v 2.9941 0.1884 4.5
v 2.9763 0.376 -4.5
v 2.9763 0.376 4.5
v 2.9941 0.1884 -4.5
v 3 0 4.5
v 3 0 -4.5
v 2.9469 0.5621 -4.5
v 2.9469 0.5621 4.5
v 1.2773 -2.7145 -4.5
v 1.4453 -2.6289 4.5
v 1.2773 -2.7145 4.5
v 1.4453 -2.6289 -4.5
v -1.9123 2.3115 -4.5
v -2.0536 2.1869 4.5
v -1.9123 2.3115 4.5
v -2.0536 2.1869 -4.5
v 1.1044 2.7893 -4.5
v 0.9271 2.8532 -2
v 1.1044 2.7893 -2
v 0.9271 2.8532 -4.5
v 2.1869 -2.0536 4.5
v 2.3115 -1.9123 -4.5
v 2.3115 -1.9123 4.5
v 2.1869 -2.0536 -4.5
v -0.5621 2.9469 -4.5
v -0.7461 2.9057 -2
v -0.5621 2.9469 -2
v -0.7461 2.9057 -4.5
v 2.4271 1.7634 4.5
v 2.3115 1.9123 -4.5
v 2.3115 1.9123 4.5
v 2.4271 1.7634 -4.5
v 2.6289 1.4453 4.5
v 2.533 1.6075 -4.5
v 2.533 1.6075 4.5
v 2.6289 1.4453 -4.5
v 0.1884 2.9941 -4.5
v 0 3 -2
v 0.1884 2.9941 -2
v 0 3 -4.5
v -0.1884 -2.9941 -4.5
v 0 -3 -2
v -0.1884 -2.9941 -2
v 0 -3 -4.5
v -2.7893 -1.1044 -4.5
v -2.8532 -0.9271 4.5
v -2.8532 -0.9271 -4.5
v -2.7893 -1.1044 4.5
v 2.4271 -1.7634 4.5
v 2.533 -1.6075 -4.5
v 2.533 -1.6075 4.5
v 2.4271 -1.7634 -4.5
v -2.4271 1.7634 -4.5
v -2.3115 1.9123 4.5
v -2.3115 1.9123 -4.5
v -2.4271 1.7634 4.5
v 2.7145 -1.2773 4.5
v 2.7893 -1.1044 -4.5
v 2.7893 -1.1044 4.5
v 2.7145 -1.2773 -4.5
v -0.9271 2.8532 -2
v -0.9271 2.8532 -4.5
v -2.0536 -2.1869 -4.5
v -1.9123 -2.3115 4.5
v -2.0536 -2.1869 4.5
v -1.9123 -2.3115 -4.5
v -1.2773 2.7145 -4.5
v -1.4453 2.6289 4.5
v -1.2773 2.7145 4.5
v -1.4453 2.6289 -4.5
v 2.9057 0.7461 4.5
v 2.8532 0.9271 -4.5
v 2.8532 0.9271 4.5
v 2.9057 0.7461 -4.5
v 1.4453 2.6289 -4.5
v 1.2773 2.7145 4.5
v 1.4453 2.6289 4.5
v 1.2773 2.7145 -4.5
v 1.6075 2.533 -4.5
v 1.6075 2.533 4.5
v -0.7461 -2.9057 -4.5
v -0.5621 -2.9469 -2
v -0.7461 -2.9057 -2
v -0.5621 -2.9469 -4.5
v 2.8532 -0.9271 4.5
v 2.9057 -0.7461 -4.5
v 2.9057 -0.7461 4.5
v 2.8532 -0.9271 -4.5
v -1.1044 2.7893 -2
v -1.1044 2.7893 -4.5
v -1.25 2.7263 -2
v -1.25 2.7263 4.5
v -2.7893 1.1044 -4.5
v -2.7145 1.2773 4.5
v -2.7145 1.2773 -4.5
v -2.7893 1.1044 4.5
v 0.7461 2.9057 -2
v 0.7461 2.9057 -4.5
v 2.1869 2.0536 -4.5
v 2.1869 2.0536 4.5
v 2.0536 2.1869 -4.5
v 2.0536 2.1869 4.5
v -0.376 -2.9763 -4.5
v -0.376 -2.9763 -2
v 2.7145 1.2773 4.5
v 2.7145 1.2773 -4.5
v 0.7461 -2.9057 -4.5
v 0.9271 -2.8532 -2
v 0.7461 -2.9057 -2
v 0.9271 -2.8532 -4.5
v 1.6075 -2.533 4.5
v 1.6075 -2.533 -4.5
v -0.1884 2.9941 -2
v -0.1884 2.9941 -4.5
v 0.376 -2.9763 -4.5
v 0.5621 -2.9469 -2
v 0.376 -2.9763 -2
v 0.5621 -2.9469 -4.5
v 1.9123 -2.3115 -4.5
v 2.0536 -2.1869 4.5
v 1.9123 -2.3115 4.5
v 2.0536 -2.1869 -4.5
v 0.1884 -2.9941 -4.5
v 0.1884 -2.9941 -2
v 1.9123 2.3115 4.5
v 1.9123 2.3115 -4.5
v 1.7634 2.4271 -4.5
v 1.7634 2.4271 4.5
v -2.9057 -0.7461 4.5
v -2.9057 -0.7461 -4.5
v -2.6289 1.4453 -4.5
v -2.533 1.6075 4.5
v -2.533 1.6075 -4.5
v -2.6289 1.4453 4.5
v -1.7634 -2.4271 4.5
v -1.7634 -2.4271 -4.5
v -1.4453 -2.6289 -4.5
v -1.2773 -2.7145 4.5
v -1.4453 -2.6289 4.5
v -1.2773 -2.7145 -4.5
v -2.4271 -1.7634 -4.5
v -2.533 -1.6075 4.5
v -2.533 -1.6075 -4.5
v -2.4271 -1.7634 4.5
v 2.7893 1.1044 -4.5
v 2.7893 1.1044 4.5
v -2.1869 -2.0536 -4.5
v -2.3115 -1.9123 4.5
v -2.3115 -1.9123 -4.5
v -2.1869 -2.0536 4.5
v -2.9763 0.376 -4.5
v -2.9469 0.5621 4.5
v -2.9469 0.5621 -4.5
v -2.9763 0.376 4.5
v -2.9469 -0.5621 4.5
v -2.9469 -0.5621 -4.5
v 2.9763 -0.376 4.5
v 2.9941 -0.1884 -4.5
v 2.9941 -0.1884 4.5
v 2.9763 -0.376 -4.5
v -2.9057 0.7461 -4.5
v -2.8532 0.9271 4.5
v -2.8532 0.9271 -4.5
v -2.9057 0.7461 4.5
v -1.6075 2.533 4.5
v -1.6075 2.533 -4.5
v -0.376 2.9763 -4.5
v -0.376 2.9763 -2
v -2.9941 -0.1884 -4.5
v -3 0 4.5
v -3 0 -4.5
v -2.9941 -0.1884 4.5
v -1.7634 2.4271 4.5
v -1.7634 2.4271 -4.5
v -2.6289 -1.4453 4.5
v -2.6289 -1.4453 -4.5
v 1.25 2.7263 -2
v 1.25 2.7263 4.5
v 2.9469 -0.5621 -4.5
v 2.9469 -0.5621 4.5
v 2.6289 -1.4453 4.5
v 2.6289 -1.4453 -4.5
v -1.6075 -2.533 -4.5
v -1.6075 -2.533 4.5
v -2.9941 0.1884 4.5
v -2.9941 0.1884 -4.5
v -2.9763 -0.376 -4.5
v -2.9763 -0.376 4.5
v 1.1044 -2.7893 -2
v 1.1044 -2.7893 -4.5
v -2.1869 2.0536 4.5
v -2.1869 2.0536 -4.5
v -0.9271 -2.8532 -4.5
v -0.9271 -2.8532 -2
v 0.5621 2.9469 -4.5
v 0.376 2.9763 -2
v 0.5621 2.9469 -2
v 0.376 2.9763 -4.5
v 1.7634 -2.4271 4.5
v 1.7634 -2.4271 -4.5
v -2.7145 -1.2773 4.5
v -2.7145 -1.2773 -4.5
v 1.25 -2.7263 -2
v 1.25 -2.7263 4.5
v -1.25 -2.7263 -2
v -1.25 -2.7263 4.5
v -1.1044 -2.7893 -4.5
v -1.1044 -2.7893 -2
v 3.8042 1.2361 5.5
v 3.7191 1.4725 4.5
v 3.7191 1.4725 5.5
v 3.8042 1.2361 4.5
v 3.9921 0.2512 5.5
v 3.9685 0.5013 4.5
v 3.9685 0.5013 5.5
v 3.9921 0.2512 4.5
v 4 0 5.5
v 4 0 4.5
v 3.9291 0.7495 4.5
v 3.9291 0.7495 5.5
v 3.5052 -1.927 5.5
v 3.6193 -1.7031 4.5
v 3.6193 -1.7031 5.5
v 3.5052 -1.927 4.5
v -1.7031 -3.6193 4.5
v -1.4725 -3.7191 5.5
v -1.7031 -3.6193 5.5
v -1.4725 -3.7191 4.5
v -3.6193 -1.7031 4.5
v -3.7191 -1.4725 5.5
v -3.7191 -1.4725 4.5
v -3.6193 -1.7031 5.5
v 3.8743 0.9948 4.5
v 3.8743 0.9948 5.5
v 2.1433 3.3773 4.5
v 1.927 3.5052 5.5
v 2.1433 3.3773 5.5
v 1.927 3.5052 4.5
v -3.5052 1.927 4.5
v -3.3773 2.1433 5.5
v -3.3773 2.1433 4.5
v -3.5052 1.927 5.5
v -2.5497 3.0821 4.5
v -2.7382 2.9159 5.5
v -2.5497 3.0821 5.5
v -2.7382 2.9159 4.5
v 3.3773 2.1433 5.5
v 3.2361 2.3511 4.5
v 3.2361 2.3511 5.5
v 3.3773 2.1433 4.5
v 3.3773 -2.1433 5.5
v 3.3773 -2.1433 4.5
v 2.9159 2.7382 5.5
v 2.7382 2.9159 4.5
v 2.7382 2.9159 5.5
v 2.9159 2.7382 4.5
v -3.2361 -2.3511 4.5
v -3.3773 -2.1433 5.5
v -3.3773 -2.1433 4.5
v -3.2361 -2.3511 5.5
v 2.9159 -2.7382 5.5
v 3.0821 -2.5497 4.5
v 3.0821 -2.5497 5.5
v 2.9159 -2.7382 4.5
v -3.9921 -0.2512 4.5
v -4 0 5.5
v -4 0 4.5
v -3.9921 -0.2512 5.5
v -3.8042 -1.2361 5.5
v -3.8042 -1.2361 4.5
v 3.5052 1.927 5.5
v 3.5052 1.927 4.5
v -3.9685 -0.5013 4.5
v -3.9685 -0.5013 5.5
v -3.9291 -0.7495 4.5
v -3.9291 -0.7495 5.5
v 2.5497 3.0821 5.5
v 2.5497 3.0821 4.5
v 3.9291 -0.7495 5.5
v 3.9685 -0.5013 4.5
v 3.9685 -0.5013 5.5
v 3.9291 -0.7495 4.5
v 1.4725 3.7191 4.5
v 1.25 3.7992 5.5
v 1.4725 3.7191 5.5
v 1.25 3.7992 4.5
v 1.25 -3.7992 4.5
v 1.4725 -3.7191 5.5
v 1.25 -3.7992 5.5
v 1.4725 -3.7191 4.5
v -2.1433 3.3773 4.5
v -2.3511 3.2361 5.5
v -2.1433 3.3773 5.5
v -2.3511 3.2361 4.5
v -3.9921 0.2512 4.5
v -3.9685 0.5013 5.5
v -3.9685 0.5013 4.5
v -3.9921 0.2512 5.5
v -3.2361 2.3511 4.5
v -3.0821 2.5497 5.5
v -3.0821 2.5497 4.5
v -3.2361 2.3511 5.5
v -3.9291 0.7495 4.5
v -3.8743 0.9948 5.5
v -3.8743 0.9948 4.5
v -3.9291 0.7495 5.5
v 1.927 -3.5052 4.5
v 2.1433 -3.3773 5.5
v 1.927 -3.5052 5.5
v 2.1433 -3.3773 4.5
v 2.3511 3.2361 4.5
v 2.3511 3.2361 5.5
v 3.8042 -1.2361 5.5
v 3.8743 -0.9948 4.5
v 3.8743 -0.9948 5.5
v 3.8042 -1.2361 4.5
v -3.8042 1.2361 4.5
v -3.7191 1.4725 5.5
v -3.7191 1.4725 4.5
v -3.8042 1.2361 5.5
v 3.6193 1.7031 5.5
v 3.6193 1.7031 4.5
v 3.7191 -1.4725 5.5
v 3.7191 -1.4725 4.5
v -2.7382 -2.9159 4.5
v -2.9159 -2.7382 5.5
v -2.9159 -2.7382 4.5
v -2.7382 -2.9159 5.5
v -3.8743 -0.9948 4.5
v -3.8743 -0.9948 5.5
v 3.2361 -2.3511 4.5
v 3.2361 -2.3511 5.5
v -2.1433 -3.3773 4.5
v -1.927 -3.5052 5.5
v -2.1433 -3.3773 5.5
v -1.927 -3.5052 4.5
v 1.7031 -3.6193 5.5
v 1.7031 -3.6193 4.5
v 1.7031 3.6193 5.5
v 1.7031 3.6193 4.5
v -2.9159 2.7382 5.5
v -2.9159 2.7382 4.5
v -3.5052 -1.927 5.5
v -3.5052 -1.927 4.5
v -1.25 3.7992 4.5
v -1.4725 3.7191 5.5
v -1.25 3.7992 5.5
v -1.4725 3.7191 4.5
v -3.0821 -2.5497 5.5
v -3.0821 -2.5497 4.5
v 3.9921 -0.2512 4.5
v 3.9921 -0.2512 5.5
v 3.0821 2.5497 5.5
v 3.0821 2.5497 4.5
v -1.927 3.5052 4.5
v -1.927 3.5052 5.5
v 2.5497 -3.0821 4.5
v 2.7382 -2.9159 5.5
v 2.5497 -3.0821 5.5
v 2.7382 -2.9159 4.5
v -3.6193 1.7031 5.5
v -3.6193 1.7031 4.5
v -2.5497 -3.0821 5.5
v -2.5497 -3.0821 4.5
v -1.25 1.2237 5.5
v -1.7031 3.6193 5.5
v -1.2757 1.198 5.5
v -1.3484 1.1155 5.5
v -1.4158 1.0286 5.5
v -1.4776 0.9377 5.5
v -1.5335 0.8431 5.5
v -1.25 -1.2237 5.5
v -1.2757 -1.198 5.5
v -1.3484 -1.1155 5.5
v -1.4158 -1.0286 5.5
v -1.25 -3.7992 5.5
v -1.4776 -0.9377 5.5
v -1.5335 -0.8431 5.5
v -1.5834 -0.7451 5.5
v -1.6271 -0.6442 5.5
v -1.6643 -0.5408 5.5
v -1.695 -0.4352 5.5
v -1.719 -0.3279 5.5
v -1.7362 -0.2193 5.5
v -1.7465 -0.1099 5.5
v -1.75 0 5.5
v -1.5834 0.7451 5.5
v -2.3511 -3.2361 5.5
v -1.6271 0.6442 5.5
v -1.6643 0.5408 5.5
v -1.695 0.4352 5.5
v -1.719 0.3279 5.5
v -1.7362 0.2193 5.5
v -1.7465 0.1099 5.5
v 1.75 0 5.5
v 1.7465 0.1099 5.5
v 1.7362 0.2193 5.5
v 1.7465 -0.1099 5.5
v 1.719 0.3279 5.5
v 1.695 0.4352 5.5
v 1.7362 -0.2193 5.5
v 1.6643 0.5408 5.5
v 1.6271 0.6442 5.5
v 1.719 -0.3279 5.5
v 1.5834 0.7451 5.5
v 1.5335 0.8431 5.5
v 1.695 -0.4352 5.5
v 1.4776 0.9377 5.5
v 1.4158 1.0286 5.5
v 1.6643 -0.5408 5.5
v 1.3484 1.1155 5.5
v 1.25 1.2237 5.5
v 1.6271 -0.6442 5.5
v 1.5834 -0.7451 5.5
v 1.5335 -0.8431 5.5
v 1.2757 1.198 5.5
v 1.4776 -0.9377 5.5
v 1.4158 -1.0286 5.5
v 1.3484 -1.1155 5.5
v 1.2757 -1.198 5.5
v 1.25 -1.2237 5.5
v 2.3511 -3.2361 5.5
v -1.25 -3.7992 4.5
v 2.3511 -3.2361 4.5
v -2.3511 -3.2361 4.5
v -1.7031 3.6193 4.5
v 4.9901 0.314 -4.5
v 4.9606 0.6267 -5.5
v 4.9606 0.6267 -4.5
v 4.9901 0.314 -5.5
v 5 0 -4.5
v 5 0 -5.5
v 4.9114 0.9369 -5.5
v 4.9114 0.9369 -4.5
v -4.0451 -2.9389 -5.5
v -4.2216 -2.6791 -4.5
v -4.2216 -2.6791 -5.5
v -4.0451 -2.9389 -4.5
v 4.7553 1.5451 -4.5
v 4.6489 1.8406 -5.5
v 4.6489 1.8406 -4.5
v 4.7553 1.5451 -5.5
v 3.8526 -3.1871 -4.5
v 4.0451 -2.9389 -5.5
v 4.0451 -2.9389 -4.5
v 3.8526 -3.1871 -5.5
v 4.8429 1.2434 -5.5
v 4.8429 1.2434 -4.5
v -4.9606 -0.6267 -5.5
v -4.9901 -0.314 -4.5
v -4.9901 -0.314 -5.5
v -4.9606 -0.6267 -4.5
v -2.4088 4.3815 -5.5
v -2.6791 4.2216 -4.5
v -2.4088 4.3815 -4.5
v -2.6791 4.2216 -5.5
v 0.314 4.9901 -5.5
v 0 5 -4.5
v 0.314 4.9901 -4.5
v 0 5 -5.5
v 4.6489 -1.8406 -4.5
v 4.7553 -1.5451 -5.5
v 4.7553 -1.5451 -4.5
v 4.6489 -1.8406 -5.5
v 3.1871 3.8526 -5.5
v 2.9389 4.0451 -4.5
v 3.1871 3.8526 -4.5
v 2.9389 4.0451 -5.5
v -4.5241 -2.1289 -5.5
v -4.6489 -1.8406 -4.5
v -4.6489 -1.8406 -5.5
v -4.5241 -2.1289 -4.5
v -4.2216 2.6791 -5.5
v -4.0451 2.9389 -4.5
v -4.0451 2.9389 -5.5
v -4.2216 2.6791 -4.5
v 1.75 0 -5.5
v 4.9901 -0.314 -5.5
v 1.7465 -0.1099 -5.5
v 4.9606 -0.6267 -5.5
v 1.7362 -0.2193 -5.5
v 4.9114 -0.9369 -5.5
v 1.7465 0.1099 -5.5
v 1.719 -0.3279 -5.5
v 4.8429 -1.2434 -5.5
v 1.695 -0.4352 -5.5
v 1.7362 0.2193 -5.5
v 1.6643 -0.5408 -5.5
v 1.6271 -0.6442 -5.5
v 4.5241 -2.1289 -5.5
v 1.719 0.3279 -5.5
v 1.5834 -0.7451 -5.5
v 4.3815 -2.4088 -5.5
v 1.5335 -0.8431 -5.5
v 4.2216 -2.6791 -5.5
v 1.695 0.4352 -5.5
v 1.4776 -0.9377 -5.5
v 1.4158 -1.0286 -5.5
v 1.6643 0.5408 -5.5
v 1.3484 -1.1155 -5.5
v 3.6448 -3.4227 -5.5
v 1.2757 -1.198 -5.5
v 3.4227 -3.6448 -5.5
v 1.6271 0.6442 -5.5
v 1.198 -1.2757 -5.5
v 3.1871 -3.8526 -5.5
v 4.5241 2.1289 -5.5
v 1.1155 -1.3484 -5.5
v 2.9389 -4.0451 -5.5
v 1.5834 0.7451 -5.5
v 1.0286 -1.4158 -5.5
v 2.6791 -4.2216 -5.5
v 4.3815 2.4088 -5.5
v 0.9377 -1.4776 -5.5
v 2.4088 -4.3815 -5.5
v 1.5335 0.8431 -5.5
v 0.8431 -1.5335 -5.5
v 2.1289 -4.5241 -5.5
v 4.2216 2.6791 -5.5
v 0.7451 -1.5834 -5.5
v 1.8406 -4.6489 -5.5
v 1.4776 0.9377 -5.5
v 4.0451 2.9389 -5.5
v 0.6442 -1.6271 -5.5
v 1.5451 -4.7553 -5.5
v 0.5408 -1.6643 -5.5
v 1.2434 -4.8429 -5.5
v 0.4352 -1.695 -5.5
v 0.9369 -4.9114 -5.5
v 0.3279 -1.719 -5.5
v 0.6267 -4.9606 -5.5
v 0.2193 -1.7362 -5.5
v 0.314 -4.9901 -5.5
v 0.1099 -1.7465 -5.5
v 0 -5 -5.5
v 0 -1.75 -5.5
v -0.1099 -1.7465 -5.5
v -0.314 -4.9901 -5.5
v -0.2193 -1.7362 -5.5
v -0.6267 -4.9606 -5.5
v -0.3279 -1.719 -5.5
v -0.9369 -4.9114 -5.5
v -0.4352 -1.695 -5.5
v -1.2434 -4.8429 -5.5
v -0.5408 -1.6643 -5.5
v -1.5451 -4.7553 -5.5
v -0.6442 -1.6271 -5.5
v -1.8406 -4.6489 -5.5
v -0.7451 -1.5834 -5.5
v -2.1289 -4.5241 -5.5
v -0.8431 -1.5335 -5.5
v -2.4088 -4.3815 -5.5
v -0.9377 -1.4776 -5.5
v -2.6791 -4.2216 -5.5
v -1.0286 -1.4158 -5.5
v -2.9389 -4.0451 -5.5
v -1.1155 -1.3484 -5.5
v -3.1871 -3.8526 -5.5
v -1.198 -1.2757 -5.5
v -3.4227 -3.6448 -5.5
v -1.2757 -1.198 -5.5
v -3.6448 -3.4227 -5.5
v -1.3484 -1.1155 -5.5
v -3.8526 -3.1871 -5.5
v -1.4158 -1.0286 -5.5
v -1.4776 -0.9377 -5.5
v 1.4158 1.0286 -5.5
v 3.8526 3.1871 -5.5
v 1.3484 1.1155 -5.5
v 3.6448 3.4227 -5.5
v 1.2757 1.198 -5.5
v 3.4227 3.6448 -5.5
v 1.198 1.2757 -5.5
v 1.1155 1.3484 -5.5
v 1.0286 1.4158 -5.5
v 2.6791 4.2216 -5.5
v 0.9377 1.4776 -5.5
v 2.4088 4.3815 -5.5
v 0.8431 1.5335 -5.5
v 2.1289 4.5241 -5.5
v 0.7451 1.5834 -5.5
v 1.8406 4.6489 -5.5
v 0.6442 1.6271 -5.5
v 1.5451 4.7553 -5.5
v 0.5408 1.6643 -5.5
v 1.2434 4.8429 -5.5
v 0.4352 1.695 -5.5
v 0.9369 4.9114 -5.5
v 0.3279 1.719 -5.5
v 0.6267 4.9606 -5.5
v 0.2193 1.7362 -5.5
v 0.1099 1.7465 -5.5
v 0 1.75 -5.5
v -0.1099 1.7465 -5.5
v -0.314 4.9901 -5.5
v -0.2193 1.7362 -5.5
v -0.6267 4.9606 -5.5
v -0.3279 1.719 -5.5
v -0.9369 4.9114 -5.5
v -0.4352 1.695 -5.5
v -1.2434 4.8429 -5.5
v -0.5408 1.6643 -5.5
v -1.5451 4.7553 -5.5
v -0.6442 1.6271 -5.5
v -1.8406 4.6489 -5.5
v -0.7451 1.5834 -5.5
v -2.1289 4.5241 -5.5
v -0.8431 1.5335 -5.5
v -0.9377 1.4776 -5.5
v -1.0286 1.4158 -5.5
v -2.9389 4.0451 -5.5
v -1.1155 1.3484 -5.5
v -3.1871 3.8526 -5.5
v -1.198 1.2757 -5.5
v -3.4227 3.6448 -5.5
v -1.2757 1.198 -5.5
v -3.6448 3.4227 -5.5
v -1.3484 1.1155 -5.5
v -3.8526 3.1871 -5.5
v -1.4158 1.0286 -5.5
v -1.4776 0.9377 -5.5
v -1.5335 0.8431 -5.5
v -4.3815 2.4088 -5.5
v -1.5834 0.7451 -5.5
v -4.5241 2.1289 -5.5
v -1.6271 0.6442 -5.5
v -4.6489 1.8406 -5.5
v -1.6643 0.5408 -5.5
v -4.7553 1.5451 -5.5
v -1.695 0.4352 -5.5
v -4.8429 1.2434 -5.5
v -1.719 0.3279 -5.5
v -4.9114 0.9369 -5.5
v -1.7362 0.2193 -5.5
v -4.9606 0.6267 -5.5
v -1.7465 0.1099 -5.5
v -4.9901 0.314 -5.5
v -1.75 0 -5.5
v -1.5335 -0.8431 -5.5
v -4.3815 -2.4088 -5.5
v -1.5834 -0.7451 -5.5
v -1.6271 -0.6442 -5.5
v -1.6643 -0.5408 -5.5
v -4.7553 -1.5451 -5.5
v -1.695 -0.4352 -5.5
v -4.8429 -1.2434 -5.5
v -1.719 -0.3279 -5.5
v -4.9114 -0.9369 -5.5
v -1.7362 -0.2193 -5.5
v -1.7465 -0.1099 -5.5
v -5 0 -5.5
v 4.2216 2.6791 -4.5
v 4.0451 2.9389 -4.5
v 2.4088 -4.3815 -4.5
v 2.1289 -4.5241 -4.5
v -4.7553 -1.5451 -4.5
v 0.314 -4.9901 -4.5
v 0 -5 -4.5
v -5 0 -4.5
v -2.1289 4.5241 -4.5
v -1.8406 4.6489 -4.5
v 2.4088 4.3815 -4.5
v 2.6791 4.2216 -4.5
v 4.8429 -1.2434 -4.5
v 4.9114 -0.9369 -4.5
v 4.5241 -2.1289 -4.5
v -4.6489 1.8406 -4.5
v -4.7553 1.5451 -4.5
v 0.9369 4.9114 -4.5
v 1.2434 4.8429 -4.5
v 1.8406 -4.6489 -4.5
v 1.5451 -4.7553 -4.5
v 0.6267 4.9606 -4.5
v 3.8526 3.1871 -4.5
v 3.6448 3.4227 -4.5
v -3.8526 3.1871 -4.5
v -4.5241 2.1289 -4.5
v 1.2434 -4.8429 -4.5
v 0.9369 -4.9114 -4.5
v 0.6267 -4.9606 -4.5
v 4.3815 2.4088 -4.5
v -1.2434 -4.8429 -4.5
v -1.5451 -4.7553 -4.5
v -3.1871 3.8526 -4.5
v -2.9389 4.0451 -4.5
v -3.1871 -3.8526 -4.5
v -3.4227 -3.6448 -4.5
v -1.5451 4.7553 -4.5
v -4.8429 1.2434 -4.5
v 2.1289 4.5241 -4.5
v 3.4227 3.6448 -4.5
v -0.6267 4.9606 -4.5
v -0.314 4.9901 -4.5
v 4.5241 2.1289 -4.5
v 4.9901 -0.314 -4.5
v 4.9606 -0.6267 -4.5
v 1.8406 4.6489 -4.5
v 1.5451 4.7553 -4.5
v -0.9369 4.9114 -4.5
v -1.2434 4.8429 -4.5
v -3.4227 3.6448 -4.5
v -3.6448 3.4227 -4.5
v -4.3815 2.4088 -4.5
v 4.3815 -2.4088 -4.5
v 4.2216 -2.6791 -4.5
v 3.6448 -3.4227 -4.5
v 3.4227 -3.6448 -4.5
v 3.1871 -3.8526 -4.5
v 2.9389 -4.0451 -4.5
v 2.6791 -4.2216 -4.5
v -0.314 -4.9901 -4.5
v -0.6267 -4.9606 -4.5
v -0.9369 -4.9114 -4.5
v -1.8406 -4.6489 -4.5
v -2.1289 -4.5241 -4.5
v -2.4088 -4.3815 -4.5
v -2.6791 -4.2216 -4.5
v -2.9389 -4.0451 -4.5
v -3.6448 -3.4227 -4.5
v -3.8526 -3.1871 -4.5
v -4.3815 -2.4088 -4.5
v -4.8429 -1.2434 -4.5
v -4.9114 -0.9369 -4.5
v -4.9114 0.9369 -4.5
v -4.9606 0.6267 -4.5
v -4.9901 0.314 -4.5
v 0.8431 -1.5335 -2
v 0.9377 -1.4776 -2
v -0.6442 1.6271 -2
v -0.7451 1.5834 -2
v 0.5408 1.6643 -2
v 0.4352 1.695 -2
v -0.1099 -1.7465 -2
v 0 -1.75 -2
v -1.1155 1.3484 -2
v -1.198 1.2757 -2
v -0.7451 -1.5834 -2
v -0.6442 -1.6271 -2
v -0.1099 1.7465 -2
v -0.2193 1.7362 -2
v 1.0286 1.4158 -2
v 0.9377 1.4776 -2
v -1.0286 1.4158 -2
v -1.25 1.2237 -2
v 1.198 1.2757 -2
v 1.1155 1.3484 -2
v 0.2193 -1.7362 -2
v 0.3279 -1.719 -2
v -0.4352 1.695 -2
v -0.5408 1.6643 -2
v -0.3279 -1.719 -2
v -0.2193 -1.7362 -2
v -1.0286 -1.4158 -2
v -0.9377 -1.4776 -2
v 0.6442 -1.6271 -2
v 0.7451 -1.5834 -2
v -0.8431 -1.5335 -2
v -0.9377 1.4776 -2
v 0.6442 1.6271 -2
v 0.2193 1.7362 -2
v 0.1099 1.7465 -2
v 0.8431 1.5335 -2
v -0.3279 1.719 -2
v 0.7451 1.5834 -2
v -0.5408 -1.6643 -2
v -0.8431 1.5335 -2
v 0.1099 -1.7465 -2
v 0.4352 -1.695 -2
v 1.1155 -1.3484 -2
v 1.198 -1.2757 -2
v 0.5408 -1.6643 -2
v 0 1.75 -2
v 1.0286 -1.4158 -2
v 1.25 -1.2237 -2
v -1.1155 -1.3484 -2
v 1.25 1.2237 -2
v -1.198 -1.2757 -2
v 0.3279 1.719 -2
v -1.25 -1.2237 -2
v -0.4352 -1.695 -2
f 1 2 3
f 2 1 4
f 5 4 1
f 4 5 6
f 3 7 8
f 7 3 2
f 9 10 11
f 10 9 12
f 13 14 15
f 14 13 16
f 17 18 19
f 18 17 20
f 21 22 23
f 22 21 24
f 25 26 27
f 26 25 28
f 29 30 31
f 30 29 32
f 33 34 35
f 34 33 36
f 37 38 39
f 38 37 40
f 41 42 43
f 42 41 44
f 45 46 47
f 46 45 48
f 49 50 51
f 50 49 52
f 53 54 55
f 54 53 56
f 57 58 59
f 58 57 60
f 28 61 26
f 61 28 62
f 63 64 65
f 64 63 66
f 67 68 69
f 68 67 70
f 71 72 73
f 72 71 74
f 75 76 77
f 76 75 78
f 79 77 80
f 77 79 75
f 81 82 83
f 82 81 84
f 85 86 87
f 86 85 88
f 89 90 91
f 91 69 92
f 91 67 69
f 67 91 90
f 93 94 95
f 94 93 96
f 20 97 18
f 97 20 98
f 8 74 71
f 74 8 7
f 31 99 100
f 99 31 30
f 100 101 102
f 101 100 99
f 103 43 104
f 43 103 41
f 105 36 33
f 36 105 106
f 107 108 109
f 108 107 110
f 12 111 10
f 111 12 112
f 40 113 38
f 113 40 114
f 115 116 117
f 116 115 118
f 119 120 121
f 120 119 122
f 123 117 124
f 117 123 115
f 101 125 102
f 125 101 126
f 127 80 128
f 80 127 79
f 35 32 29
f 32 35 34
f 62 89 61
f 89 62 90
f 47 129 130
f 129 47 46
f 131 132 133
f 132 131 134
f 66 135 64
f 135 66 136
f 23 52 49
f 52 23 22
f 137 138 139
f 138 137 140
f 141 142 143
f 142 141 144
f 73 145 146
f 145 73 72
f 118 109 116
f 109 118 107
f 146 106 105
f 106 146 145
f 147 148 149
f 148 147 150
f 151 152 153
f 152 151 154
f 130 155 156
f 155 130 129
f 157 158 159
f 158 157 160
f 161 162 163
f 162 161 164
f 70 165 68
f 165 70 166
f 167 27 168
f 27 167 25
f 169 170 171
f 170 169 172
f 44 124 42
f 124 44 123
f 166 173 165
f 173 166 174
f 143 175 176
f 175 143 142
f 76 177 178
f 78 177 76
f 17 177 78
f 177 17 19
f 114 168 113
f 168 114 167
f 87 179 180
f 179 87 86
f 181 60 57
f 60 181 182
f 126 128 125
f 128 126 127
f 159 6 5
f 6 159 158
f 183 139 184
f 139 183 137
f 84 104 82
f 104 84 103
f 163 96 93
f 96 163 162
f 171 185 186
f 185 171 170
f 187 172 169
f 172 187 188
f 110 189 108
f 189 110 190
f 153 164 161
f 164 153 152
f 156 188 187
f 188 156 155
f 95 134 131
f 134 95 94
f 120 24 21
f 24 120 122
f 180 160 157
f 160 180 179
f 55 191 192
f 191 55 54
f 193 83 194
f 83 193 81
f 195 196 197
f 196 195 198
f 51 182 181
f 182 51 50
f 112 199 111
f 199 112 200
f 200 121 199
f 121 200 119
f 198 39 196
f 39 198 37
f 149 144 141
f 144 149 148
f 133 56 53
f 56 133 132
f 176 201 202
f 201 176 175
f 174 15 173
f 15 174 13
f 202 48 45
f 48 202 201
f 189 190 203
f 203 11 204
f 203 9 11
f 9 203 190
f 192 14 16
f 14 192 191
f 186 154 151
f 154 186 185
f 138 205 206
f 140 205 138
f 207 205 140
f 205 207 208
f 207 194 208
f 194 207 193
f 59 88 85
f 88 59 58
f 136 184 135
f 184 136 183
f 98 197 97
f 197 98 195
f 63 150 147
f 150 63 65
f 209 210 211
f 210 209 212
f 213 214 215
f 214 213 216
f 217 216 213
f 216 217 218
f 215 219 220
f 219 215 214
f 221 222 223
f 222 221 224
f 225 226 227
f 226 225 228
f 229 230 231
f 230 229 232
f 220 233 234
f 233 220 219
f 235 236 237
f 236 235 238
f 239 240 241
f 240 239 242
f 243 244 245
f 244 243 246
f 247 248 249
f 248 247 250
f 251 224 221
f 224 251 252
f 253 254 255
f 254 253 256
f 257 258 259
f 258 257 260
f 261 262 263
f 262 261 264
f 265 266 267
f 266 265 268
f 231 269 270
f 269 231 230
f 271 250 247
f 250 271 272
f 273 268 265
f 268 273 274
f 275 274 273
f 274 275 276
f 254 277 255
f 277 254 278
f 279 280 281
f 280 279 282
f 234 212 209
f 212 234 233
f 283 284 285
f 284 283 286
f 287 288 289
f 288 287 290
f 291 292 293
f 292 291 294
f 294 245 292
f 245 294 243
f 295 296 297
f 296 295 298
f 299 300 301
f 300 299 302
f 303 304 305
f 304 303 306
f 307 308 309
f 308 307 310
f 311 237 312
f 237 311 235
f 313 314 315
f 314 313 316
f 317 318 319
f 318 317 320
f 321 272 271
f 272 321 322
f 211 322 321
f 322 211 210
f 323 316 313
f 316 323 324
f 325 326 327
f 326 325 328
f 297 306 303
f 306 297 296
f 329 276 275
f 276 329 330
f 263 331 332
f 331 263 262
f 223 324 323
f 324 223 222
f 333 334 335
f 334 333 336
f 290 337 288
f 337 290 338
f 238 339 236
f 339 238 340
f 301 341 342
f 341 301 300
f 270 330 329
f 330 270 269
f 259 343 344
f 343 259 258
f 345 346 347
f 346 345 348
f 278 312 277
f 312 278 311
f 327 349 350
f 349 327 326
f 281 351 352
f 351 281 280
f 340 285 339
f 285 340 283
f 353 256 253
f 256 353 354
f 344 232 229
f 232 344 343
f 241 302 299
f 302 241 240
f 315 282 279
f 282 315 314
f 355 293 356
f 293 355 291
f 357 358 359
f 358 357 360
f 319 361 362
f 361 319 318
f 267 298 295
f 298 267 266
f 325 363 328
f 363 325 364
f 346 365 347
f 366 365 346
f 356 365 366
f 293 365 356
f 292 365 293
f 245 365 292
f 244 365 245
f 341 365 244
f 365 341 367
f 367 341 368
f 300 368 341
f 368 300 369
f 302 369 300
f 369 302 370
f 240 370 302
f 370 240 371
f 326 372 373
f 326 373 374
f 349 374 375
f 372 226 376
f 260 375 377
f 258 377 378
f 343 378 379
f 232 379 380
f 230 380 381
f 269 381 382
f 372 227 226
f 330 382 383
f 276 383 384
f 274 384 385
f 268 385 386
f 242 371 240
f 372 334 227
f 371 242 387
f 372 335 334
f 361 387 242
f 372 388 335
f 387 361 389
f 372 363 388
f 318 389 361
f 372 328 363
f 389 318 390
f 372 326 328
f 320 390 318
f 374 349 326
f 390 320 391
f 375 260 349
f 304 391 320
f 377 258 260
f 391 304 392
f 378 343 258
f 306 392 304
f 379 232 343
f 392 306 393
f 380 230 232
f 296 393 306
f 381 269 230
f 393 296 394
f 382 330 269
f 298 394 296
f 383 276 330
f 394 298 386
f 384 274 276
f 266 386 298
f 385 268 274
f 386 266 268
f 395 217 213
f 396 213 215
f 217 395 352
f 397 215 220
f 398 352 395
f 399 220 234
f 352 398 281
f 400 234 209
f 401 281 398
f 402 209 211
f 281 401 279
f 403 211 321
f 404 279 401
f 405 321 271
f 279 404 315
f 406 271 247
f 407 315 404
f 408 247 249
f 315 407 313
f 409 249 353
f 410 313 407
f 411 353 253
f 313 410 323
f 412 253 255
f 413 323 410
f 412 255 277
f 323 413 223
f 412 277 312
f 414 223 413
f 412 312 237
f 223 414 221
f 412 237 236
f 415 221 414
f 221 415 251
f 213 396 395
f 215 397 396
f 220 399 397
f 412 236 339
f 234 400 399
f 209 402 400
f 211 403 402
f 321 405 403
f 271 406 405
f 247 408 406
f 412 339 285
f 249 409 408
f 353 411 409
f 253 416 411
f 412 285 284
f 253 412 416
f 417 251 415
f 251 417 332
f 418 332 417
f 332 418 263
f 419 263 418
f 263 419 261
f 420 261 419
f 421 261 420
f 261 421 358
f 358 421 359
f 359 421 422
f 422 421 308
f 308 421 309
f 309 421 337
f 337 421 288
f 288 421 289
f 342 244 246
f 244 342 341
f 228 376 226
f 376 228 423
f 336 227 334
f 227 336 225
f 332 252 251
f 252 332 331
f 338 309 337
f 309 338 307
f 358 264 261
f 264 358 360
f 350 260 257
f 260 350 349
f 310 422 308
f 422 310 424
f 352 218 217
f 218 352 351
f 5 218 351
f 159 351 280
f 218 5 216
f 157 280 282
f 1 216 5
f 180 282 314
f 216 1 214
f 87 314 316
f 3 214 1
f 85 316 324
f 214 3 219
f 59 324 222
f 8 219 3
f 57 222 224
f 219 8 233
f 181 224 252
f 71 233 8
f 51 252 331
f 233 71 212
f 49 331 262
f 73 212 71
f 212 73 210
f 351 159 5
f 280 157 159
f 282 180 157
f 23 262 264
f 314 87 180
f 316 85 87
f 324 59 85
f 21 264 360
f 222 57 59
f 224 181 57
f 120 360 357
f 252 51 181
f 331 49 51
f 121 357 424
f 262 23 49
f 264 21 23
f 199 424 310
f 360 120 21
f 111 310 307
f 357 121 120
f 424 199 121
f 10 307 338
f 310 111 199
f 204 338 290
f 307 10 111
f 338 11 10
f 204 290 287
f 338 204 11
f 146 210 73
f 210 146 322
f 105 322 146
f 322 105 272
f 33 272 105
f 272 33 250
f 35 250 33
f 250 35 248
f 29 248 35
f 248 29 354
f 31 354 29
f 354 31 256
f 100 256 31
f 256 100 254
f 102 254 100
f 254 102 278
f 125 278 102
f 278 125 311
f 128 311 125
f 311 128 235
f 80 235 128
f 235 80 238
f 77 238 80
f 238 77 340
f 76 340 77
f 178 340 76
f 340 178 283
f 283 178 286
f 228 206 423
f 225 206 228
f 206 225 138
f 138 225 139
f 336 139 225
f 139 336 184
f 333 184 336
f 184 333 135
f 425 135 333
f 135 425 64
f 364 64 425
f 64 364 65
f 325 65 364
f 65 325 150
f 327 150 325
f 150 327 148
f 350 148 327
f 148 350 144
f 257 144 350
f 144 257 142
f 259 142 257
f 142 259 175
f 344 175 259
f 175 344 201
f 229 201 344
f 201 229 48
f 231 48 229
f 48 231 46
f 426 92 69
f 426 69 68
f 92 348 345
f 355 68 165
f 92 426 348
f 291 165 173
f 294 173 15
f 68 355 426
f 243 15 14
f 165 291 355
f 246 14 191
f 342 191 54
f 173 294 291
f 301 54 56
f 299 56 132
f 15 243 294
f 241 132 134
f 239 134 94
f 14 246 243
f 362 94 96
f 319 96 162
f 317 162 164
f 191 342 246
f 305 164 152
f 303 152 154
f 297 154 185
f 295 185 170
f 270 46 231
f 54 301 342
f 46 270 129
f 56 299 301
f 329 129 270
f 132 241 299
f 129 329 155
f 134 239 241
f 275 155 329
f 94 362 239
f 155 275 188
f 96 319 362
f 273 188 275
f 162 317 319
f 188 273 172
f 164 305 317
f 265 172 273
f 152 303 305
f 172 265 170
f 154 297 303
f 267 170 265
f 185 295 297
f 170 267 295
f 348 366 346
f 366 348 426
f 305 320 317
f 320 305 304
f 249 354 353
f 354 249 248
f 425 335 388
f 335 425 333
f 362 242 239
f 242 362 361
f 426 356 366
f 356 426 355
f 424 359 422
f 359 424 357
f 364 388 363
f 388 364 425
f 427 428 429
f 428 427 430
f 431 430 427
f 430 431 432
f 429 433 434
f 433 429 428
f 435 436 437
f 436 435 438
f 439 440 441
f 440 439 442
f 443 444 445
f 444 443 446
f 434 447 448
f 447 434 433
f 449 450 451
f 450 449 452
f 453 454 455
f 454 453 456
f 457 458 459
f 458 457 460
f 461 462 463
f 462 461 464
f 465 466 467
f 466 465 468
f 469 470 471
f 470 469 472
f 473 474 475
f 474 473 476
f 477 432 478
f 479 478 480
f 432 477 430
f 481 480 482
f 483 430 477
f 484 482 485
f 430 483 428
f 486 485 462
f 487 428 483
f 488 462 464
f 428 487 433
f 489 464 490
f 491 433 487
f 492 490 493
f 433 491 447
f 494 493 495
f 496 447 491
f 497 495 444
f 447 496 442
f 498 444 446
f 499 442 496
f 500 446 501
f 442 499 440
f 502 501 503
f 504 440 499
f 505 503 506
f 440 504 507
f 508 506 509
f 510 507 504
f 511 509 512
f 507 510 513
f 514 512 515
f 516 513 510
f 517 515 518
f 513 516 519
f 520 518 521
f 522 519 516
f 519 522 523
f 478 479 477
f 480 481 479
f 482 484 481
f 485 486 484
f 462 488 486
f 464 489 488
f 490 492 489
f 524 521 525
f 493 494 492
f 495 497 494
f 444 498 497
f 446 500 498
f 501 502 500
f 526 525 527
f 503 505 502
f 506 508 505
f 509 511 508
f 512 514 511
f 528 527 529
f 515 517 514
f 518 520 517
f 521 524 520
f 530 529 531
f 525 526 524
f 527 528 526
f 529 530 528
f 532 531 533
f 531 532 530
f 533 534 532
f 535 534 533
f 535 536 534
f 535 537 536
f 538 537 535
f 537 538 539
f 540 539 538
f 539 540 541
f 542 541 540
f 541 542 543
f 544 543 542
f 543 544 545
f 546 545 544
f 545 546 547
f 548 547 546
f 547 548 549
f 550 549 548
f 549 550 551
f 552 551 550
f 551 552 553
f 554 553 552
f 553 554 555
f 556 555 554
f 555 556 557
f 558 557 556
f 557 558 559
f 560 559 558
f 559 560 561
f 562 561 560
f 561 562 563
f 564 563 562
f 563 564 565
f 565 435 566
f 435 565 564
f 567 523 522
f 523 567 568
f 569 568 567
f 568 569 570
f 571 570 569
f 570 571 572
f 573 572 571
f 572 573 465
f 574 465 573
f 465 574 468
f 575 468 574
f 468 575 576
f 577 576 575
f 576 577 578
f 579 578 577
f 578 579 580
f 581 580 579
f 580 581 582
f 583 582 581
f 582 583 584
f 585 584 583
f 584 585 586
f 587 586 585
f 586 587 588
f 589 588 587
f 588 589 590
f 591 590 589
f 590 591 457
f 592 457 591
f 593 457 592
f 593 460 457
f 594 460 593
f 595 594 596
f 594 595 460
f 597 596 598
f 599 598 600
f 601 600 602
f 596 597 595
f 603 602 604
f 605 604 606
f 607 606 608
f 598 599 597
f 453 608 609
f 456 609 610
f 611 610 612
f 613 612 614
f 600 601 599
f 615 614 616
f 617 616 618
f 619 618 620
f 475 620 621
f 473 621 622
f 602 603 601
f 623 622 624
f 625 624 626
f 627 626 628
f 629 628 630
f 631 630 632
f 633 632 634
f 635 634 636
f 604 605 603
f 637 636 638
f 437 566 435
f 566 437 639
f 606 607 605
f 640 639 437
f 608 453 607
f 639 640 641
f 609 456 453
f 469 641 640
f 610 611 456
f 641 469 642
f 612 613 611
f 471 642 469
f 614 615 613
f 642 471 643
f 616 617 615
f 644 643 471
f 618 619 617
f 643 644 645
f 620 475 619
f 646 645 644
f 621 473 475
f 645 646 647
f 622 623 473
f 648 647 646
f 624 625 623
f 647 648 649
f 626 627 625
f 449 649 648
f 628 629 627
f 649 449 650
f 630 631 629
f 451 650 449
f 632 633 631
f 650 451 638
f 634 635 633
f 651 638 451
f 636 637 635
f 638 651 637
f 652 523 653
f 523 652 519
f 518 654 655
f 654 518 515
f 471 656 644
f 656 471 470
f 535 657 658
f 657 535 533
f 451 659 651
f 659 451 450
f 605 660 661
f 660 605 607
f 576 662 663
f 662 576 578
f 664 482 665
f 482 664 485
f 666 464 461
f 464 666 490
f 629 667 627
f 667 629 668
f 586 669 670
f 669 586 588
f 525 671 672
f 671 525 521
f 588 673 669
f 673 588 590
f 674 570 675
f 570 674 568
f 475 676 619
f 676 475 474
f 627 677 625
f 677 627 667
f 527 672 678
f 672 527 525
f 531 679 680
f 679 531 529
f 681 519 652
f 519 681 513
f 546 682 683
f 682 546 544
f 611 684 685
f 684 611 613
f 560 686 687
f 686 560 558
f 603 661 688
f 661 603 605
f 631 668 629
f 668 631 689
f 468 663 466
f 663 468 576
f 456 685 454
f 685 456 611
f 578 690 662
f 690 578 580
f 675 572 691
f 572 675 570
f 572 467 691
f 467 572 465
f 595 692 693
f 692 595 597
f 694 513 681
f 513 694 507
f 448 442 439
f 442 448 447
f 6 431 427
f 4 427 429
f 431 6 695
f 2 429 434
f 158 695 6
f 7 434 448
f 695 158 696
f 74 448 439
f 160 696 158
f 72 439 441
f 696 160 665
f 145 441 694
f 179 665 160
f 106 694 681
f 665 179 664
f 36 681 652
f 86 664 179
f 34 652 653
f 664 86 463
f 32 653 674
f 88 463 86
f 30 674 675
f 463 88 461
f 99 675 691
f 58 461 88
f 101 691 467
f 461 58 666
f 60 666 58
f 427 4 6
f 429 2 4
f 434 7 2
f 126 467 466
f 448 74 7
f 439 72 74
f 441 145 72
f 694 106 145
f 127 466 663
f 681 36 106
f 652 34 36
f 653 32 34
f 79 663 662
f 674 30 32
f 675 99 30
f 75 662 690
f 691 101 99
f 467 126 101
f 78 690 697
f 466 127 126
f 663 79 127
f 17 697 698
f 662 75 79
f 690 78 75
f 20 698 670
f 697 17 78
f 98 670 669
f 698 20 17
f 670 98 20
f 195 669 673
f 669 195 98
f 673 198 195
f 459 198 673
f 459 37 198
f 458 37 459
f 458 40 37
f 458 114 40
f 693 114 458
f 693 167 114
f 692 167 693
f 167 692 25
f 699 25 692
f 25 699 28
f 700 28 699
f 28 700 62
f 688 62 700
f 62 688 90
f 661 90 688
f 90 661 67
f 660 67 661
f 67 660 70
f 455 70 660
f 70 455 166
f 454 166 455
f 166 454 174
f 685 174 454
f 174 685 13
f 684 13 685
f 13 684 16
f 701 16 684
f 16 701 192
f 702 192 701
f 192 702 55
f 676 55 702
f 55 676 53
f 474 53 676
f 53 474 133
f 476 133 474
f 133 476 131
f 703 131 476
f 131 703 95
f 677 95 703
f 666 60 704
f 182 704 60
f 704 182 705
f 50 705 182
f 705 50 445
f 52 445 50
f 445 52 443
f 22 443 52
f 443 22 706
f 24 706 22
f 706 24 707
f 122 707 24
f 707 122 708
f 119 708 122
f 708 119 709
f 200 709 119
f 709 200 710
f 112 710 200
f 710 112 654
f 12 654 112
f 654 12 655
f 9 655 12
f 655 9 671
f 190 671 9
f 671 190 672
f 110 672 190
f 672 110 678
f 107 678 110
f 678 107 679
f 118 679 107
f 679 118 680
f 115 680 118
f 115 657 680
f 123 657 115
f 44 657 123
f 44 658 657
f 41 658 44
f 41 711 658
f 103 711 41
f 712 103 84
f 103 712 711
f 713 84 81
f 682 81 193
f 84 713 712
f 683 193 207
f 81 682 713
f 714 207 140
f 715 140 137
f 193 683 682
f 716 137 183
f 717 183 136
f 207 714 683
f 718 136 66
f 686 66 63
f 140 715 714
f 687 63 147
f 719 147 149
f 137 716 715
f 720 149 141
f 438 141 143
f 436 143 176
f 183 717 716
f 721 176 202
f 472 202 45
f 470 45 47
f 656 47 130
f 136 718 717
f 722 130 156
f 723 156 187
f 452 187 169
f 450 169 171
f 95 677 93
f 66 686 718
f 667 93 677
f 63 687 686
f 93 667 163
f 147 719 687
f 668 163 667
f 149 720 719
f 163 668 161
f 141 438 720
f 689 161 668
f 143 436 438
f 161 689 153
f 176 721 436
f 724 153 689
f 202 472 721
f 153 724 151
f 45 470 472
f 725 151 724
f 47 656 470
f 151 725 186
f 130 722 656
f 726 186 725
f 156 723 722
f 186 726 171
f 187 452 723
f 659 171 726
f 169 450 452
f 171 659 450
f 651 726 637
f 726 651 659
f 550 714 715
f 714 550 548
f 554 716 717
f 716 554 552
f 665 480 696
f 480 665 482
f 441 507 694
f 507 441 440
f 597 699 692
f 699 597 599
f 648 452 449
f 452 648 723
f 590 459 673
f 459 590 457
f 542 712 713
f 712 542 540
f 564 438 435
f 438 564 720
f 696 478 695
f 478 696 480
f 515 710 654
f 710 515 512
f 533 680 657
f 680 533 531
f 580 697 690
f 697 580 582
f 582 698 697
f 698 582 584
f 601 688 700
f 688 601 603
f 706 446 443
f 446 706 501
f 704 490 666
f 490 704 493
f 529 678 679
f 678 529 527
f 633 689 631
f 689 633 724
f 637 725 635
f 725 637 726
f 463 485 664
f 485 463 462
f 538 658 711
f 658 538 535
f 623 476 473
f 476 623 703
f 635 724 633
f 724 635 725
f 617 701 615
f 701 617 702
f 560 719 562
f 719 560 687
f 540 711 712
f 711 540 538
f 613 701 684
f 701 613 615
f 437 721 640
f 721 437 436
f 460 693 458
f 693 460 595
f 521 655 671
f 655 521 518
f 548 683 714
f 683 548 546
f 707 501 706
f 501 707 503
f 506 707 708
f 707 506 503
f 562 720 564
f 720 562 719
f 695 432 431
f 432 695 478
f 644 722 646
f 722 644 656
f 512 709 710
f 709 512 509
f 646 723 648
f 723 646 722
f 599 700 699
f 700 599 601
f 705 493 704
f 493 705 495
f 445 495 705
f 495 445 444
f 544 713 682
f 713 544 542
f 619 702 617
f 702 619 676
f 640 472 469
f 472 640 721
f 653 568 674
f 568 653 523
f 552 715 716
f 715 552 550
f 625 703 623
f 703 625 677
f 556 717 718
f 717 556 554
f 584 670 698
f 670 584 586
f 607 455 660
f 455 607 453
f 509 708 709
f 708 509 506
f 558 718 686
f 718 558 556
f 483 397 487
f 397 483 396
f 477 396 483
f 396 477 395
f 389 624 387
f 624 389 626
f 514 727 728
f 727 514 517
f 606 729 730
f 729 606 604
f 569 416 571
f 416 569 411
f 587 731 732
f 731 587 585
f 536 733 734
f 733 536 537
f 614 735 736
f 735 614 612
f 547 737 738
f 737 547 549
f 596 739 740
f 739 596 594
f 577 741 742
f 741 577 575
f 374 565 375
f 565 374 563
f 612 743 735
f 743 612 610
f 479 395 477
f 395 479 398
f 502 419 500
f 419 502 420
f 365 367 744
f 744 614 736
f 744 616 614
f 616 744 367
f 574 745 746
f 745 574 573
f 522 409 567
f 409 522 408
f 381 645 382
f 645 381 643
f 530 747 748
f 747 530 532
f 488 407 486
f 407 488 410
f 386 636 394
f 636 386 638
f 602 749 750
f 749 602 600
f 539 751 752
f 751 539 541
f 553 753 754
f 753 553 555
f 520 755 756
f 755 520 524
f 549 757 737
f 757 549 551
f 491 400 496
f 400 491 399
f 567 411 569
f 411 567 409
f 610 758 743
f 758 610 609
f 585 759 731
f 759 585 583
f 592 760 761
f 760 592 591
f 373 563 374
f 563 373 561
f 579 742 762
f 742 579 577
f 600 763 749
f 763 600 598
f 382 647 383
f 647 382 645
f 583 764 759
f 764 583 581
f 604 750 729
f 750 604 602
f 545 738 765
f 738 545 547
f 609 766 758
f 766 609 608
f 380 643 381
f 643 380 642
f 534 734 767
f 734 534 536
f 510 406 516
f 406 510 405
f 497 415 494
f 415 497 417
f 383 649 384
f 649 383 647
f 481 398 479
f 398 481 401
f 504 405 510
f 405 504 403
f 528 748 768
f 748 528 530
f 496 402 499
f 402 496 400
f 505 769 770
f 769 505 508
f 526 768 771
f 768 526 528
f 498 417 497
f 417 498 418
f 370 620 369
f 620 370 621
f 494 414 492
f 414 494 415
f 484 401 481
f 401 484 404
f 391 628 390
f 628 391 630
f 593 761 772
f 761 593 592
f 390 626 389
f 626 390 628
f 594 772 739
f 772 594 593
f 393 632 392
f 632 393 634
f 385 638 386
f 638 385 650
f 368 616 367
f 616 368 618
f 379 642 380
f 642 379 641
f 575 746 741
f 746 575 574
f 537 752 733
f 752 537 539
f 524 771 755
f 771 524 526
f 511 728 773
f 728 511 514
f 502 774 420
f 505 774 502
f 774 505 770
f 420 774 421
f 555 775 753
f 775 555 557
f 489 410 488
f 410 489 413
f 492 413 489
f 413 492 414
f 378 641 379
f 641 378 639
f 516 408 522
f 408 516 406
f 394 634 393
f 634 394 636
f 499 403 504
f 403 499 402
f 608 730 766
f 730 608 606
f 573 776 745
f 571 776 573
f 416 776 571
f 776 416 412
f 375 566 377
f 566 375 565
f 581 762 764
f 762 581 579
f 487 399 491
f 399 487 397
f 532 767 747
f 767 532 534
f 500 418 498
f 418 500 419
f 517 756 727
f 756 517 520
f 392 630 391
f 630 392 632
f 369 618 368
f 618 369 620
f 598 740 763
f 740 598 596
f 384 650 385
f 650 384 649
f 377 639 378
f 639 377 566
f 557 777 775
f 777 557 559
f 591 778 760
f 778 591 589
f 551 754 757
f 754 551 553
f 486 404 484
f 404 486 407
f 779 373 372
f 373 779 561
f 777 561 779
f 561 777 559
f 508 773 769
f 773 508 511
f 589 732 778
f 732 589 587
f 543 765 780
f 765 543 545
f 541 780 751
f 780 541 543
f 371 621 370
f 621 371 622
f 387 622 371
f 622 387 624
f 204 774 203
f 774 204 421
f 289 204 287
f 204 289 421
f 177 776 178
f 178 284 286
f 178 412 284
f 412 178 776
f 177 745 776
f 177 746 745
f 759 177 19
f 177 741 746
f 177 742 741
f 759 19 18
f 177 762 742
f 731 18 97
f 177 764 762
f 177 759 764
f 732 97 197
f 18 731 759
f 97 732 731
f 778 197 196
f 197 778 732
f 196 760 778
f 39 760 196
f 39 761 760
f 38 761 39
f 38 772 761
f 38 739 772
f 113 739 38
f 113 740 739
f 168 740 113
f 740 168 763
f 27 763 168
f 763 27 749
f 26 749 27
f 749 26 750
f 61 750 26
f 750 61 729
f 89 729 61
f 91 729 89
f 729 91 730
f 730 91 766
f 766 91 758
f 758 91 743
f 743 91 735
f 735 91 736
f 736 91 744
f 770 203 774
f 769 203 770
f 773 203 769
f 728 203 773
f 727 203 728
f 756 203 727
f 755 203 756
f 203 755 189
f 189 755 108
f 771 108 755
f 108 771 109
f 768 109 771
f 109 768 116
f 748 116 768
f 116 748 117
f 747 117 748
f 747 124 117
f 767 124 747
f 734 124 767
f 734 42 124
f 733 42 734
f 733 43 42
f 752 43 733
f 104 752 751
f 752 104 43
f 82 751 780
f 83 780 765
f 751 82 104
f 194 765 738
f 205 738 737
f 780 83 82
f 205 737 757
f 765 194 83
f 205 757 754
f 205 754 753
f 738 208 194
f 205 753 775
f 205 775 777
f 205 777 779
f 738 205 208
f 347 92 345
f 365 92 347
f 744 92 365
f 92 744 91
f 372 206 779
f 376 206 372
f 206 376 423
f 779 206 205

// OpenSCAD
// file: Gilgahedron.scad
//Copyright 2022-2023 Gilgamech Technologies
//Title: Gilgahedron.scad v1.5
//Made by: Stephen Gillie
//Created on: 3/17/2022
//Updated on: 3/29/2023
//Units: any
//Notes: 
//v1.4 all shapes checked for inversions with f12, normalized to units of 1, and support full Gilgahedron notation (dimensions of size/scale, translation, rotation)
//1.5: Added gOval.

//icon_extrude("BigG.dxf",1,1,5);
//inverse_icon_extrude("BigG.dxf",1,1,5);

//Basic Shapes
module gCube(xSize=1,ySize=1,zSize=1,xMove=0,yMove=0,zMove=0,xRotate=0,yRotate=0,zRotate=0){
translate([xMove,yMove,zMove])
rotate([xRotate,yRotate,zRotate])
    cube([xSize,ySize,zSize],center=true);
}

module gCylinder(h=1,r1=1,r2=1,xMove=0,yMove=0,zMove=0,xRotate=0,yRotate=0,zRotate=0){
translate([xMove,yMove,zMove])
rotate([xRotate,yRotate,zRotate])
    cylinder(h,r1,r2,center=true,$fn=100);
}

module gSphere(xScale=1,yScale=1,zScale=1,xMove=0,yMove=0,zMove=0,xRotate=0,yRotate=0,zRotate=0){
translate([xMove,yMove,zMove])
rotate([xRotate,yRotate,zRotate])
    scale([xScale,yScale,zScale]) 
    sphere(r=(1),$fn=100);
}

module gOval(h=100,x=40,y=60) {
    scale([1,(y/x),1])
    gCylinder(100,40,40);
}

//Complex polyhedra
module pyramid(xScale=1,yScale=1,zScale=1,xMove=0,yMove=0,zMove=0,xRotate=0,yRotate=0,zRotate=0){

Points = [
  [ 0,  0,  0 ],  //0
  [ 8,  0,  0 ],  //1
  [ 8,  8,  0 ],  //2
  [ 0,  8,  0 ],  //3
  [ 4,  4,  8 ]];  //4

Faces = [
  [0,1,2,3],  // bottom
  [4,1,0],  // front
  [4,2,1],  // right
  [4,3,2],  // back
  [4,0,3]]; // left
  
translate([xMove,yMove,zMove])
rotate([xRotate,yRotate,zRotate])
    scale([xScale,yScale,zScale]) 
polyhedron( Points, Faces );
}
module d4(xScale=1,yScale=1,zScale=1,xMove=0,yMove=0,zMove=0,xRotate=0,yRotate=0,zRotate=0){

Points = [
  [ 0,  0,  0 ],  //0
  [ 1,  .25,  0 ],  //1
  [ .25,  1,  0 ],  //2
  [ .375,  .375,  .875]];  //3

Faces = [
  [0,1,2],  // bottom
  [1,0,3],  // right
  [0,2,3],  // left
  [1,3,2]]; // back
  
translate([xMove,yMove,zMove])
rotate([xRotate,yRotate,zRotate])
    scale([xScale,yScale,zScale]) 
polyhedron( Points, Faces );
}
module d8(xScale=1,yScale=1,zScale=1,xMove=0,yMove=0,zMove=0,xRotate=0,yRotate=0,zRotate=0){

Points = [
  [ 4, 4, 0 ],  //0
  [ 8, 0, 6 ],  //1
  [ 8, 8, 6 ],  //2
  [ 0, 8, 6 ],  //3
  [ 0, 0, 6 ],  //4
  [ 4, 4,12 ]];  //0

Faces = [
  [0,1,2], // bottom front
  [0,2,3], // bottom right
  [0,3,4], // bottom back
  [0,4,1], // bottom left
  [1,5,2], // top front
  [2,5,3], // top right
  [3,5,4], // top back
  [4,5,1]]; // top left
  
translate([xMove,yMove,zMove])
rotate([xRotate,yRotate,zRotate])
    scale([xScale,yScale,zScale]) 
polyhedron( Points, Faces );
}
module silo(xScale=1,yScale=1,zScale=1,xMove=0,yMove=0,zMove=0,xRotate=0,yRotate=0,zRotate=0){

height=.7075;
diameter=height*0.4125;

translate([xMove,yMove,zMove+(height/2)])
rotate([xRotate,yRotate,zRotate])
    scale([xScale,yScale,zScale]) {
gCylinder(height,diameter,diameter);
gSphere(diameter,diameter,diameter,0,0,height/2);
}}

//Extrusion
module file_extrude(filename="bigG.dxf"){
translate([-20,-20,0])
linear_extrude(height = 1, center = true)
import (file = filename);
}
module icon_extrude(filename="bigG.dxf",xScale=1,yScale=1,zScale=1,xMove=0,yMove=0,zMove=0,xRotate=0,yRotate=0,zRotate=0){
translate([xMove,yMove,zMove])
rotate([xRotate,yRotate,zRotate])
scale([xScale,yScale,zScale])
file_extrude(filename);

}
module inverse_icon_extrude(filename="bigG.dxf",xScale=1,yScale=1,zScale=1,xMove=0,yMove=0,zMove=0,xRotate=0,yRotate=0,zRotate=0){
bezelMult = 45;
difference(){
gCube(xScale*bezelMult,yScale*bezelMult,zScale,xMove,yMove+.5,zMove,xRotate,yRotate,zRotate);
icon_extrude(filename,xScale,yScale,zScale*1.05,xMove,yMove,zMove,xRotate,yRotate,zRotate);
}}

module text_extrude(string="Hello World!",height=1){
translate([-36,-4.5,0])
linear_extrude(height)
    text(string);
}
module gText(text="Hello World!",xSize=1,ySize=1,zSize=1,xTrans=0,yTrans=0,zTrans=0,xRot=0,yRot=0,zRot=0){
    translate([xTrans,yTrans,zTrans])
    rotate([xRot,yRot,zRot])
    scale([xSize*.1,ySize*.1,zSize*.1])
    linear_extrude(1)
    text(text);
}

//utility
module roundedBox(xSize=36,ySize=36,zSize=2,xTrans=0,yTrans=0,zTrans=0,xRot=0,yRot=0,zRot=0){
translate([xTrans,yTrans,zTrans])
rotate([xRot,yRot,zRot])
union(){
cubeSF=1.25;
gCube(xSize/cubeSF,ySize,zSize);
gCube(xSize,ySize/cubeSF-1,zSize);

cylSF=cubeSF*2;
cr=xSize*.085;

//dishwasher
//cx=xSize/cylSF+.4;
//cy=ySize/cylSF-1.2;

//bathtub
cx=xSize/cylSF+.8; 
cy=ySize/cylSF-1.6;


gCylinder(zSize,cr,cr,cx,cy);
gCylinder(zSize,cr,cr,-cx,cy);
gCylinder(zSize,cr,cr,cx,-cy);
gCylinder(zSize,cr,cr,-cx,-cy);
}}
module gBowl(length=4,width=4,depth=4,xTrans=0,yTrans=0,zTrans=0,xRot=0,yRot=0,zRot=0){
translate([xTrans,yTrans,zTrans])
    rotate([xRot,yRot,zRot])
difference(){
    gSphere(length,width,depth);
    gSphere(length,width,depth*1.125,0,0,depth*.125);
}}
//bar stock
module gTube(length=1,r1=1,r2=1,xTrans=0,yTrans=0,zTrans=0,xRot=0,yRot=0,zRot=0){
difference(){
    gCylinder(length,r1,r2,xTrans,yTrans,zTrans,xRot,yRot,zRot);
    gCylinder(length*1.1,r1*.9,r2*.9,xTrans,yTrans,zTrans,xRot,yRot,zRot);
}}
module roundedEdge(xSize = 1,ySize = 2,zSize = 10,xTrans=0,yTrans=0,zTrans=0,xRot=0,yRot=0,zRot=0) {
intersection() {
    gCylinder(zSize,ySize/2,ySize/2,xTrans,yTrans,zTrans,xRot,yRot,zRot);
    gCube(xSize,ySize,zSize,xTrans,yTrans,zTrans,xRot,yRot,zRot);
}}
//library
module checkPrint(Size=109){gCube(Size,Size,Size);}
// main file
//Copyright 2022 Gilgamech Technologies
//Title: 
//Made by: Stephen Gillie
//Created on: 4/07/2022
//Updated on: 4/07/2022
//Units: idk (idk) meters (1) inches (0.0254) cm (.01) millimeters (.001) feet (.3048)
//Notes: 

include  <Gilgahedron.scad>

difference(){
mainBody();
cutSlot();
}

module mainBody(){
gCylinder(10,3,3);
gCylinder(1,4,4,0,0,5);
gCylinder(1,5,5,0,0,-5);
}

module cutSlot(){
gCylinder(12,1.75,1.75);
gCube(2.5,8,8,0,0,2);
}
